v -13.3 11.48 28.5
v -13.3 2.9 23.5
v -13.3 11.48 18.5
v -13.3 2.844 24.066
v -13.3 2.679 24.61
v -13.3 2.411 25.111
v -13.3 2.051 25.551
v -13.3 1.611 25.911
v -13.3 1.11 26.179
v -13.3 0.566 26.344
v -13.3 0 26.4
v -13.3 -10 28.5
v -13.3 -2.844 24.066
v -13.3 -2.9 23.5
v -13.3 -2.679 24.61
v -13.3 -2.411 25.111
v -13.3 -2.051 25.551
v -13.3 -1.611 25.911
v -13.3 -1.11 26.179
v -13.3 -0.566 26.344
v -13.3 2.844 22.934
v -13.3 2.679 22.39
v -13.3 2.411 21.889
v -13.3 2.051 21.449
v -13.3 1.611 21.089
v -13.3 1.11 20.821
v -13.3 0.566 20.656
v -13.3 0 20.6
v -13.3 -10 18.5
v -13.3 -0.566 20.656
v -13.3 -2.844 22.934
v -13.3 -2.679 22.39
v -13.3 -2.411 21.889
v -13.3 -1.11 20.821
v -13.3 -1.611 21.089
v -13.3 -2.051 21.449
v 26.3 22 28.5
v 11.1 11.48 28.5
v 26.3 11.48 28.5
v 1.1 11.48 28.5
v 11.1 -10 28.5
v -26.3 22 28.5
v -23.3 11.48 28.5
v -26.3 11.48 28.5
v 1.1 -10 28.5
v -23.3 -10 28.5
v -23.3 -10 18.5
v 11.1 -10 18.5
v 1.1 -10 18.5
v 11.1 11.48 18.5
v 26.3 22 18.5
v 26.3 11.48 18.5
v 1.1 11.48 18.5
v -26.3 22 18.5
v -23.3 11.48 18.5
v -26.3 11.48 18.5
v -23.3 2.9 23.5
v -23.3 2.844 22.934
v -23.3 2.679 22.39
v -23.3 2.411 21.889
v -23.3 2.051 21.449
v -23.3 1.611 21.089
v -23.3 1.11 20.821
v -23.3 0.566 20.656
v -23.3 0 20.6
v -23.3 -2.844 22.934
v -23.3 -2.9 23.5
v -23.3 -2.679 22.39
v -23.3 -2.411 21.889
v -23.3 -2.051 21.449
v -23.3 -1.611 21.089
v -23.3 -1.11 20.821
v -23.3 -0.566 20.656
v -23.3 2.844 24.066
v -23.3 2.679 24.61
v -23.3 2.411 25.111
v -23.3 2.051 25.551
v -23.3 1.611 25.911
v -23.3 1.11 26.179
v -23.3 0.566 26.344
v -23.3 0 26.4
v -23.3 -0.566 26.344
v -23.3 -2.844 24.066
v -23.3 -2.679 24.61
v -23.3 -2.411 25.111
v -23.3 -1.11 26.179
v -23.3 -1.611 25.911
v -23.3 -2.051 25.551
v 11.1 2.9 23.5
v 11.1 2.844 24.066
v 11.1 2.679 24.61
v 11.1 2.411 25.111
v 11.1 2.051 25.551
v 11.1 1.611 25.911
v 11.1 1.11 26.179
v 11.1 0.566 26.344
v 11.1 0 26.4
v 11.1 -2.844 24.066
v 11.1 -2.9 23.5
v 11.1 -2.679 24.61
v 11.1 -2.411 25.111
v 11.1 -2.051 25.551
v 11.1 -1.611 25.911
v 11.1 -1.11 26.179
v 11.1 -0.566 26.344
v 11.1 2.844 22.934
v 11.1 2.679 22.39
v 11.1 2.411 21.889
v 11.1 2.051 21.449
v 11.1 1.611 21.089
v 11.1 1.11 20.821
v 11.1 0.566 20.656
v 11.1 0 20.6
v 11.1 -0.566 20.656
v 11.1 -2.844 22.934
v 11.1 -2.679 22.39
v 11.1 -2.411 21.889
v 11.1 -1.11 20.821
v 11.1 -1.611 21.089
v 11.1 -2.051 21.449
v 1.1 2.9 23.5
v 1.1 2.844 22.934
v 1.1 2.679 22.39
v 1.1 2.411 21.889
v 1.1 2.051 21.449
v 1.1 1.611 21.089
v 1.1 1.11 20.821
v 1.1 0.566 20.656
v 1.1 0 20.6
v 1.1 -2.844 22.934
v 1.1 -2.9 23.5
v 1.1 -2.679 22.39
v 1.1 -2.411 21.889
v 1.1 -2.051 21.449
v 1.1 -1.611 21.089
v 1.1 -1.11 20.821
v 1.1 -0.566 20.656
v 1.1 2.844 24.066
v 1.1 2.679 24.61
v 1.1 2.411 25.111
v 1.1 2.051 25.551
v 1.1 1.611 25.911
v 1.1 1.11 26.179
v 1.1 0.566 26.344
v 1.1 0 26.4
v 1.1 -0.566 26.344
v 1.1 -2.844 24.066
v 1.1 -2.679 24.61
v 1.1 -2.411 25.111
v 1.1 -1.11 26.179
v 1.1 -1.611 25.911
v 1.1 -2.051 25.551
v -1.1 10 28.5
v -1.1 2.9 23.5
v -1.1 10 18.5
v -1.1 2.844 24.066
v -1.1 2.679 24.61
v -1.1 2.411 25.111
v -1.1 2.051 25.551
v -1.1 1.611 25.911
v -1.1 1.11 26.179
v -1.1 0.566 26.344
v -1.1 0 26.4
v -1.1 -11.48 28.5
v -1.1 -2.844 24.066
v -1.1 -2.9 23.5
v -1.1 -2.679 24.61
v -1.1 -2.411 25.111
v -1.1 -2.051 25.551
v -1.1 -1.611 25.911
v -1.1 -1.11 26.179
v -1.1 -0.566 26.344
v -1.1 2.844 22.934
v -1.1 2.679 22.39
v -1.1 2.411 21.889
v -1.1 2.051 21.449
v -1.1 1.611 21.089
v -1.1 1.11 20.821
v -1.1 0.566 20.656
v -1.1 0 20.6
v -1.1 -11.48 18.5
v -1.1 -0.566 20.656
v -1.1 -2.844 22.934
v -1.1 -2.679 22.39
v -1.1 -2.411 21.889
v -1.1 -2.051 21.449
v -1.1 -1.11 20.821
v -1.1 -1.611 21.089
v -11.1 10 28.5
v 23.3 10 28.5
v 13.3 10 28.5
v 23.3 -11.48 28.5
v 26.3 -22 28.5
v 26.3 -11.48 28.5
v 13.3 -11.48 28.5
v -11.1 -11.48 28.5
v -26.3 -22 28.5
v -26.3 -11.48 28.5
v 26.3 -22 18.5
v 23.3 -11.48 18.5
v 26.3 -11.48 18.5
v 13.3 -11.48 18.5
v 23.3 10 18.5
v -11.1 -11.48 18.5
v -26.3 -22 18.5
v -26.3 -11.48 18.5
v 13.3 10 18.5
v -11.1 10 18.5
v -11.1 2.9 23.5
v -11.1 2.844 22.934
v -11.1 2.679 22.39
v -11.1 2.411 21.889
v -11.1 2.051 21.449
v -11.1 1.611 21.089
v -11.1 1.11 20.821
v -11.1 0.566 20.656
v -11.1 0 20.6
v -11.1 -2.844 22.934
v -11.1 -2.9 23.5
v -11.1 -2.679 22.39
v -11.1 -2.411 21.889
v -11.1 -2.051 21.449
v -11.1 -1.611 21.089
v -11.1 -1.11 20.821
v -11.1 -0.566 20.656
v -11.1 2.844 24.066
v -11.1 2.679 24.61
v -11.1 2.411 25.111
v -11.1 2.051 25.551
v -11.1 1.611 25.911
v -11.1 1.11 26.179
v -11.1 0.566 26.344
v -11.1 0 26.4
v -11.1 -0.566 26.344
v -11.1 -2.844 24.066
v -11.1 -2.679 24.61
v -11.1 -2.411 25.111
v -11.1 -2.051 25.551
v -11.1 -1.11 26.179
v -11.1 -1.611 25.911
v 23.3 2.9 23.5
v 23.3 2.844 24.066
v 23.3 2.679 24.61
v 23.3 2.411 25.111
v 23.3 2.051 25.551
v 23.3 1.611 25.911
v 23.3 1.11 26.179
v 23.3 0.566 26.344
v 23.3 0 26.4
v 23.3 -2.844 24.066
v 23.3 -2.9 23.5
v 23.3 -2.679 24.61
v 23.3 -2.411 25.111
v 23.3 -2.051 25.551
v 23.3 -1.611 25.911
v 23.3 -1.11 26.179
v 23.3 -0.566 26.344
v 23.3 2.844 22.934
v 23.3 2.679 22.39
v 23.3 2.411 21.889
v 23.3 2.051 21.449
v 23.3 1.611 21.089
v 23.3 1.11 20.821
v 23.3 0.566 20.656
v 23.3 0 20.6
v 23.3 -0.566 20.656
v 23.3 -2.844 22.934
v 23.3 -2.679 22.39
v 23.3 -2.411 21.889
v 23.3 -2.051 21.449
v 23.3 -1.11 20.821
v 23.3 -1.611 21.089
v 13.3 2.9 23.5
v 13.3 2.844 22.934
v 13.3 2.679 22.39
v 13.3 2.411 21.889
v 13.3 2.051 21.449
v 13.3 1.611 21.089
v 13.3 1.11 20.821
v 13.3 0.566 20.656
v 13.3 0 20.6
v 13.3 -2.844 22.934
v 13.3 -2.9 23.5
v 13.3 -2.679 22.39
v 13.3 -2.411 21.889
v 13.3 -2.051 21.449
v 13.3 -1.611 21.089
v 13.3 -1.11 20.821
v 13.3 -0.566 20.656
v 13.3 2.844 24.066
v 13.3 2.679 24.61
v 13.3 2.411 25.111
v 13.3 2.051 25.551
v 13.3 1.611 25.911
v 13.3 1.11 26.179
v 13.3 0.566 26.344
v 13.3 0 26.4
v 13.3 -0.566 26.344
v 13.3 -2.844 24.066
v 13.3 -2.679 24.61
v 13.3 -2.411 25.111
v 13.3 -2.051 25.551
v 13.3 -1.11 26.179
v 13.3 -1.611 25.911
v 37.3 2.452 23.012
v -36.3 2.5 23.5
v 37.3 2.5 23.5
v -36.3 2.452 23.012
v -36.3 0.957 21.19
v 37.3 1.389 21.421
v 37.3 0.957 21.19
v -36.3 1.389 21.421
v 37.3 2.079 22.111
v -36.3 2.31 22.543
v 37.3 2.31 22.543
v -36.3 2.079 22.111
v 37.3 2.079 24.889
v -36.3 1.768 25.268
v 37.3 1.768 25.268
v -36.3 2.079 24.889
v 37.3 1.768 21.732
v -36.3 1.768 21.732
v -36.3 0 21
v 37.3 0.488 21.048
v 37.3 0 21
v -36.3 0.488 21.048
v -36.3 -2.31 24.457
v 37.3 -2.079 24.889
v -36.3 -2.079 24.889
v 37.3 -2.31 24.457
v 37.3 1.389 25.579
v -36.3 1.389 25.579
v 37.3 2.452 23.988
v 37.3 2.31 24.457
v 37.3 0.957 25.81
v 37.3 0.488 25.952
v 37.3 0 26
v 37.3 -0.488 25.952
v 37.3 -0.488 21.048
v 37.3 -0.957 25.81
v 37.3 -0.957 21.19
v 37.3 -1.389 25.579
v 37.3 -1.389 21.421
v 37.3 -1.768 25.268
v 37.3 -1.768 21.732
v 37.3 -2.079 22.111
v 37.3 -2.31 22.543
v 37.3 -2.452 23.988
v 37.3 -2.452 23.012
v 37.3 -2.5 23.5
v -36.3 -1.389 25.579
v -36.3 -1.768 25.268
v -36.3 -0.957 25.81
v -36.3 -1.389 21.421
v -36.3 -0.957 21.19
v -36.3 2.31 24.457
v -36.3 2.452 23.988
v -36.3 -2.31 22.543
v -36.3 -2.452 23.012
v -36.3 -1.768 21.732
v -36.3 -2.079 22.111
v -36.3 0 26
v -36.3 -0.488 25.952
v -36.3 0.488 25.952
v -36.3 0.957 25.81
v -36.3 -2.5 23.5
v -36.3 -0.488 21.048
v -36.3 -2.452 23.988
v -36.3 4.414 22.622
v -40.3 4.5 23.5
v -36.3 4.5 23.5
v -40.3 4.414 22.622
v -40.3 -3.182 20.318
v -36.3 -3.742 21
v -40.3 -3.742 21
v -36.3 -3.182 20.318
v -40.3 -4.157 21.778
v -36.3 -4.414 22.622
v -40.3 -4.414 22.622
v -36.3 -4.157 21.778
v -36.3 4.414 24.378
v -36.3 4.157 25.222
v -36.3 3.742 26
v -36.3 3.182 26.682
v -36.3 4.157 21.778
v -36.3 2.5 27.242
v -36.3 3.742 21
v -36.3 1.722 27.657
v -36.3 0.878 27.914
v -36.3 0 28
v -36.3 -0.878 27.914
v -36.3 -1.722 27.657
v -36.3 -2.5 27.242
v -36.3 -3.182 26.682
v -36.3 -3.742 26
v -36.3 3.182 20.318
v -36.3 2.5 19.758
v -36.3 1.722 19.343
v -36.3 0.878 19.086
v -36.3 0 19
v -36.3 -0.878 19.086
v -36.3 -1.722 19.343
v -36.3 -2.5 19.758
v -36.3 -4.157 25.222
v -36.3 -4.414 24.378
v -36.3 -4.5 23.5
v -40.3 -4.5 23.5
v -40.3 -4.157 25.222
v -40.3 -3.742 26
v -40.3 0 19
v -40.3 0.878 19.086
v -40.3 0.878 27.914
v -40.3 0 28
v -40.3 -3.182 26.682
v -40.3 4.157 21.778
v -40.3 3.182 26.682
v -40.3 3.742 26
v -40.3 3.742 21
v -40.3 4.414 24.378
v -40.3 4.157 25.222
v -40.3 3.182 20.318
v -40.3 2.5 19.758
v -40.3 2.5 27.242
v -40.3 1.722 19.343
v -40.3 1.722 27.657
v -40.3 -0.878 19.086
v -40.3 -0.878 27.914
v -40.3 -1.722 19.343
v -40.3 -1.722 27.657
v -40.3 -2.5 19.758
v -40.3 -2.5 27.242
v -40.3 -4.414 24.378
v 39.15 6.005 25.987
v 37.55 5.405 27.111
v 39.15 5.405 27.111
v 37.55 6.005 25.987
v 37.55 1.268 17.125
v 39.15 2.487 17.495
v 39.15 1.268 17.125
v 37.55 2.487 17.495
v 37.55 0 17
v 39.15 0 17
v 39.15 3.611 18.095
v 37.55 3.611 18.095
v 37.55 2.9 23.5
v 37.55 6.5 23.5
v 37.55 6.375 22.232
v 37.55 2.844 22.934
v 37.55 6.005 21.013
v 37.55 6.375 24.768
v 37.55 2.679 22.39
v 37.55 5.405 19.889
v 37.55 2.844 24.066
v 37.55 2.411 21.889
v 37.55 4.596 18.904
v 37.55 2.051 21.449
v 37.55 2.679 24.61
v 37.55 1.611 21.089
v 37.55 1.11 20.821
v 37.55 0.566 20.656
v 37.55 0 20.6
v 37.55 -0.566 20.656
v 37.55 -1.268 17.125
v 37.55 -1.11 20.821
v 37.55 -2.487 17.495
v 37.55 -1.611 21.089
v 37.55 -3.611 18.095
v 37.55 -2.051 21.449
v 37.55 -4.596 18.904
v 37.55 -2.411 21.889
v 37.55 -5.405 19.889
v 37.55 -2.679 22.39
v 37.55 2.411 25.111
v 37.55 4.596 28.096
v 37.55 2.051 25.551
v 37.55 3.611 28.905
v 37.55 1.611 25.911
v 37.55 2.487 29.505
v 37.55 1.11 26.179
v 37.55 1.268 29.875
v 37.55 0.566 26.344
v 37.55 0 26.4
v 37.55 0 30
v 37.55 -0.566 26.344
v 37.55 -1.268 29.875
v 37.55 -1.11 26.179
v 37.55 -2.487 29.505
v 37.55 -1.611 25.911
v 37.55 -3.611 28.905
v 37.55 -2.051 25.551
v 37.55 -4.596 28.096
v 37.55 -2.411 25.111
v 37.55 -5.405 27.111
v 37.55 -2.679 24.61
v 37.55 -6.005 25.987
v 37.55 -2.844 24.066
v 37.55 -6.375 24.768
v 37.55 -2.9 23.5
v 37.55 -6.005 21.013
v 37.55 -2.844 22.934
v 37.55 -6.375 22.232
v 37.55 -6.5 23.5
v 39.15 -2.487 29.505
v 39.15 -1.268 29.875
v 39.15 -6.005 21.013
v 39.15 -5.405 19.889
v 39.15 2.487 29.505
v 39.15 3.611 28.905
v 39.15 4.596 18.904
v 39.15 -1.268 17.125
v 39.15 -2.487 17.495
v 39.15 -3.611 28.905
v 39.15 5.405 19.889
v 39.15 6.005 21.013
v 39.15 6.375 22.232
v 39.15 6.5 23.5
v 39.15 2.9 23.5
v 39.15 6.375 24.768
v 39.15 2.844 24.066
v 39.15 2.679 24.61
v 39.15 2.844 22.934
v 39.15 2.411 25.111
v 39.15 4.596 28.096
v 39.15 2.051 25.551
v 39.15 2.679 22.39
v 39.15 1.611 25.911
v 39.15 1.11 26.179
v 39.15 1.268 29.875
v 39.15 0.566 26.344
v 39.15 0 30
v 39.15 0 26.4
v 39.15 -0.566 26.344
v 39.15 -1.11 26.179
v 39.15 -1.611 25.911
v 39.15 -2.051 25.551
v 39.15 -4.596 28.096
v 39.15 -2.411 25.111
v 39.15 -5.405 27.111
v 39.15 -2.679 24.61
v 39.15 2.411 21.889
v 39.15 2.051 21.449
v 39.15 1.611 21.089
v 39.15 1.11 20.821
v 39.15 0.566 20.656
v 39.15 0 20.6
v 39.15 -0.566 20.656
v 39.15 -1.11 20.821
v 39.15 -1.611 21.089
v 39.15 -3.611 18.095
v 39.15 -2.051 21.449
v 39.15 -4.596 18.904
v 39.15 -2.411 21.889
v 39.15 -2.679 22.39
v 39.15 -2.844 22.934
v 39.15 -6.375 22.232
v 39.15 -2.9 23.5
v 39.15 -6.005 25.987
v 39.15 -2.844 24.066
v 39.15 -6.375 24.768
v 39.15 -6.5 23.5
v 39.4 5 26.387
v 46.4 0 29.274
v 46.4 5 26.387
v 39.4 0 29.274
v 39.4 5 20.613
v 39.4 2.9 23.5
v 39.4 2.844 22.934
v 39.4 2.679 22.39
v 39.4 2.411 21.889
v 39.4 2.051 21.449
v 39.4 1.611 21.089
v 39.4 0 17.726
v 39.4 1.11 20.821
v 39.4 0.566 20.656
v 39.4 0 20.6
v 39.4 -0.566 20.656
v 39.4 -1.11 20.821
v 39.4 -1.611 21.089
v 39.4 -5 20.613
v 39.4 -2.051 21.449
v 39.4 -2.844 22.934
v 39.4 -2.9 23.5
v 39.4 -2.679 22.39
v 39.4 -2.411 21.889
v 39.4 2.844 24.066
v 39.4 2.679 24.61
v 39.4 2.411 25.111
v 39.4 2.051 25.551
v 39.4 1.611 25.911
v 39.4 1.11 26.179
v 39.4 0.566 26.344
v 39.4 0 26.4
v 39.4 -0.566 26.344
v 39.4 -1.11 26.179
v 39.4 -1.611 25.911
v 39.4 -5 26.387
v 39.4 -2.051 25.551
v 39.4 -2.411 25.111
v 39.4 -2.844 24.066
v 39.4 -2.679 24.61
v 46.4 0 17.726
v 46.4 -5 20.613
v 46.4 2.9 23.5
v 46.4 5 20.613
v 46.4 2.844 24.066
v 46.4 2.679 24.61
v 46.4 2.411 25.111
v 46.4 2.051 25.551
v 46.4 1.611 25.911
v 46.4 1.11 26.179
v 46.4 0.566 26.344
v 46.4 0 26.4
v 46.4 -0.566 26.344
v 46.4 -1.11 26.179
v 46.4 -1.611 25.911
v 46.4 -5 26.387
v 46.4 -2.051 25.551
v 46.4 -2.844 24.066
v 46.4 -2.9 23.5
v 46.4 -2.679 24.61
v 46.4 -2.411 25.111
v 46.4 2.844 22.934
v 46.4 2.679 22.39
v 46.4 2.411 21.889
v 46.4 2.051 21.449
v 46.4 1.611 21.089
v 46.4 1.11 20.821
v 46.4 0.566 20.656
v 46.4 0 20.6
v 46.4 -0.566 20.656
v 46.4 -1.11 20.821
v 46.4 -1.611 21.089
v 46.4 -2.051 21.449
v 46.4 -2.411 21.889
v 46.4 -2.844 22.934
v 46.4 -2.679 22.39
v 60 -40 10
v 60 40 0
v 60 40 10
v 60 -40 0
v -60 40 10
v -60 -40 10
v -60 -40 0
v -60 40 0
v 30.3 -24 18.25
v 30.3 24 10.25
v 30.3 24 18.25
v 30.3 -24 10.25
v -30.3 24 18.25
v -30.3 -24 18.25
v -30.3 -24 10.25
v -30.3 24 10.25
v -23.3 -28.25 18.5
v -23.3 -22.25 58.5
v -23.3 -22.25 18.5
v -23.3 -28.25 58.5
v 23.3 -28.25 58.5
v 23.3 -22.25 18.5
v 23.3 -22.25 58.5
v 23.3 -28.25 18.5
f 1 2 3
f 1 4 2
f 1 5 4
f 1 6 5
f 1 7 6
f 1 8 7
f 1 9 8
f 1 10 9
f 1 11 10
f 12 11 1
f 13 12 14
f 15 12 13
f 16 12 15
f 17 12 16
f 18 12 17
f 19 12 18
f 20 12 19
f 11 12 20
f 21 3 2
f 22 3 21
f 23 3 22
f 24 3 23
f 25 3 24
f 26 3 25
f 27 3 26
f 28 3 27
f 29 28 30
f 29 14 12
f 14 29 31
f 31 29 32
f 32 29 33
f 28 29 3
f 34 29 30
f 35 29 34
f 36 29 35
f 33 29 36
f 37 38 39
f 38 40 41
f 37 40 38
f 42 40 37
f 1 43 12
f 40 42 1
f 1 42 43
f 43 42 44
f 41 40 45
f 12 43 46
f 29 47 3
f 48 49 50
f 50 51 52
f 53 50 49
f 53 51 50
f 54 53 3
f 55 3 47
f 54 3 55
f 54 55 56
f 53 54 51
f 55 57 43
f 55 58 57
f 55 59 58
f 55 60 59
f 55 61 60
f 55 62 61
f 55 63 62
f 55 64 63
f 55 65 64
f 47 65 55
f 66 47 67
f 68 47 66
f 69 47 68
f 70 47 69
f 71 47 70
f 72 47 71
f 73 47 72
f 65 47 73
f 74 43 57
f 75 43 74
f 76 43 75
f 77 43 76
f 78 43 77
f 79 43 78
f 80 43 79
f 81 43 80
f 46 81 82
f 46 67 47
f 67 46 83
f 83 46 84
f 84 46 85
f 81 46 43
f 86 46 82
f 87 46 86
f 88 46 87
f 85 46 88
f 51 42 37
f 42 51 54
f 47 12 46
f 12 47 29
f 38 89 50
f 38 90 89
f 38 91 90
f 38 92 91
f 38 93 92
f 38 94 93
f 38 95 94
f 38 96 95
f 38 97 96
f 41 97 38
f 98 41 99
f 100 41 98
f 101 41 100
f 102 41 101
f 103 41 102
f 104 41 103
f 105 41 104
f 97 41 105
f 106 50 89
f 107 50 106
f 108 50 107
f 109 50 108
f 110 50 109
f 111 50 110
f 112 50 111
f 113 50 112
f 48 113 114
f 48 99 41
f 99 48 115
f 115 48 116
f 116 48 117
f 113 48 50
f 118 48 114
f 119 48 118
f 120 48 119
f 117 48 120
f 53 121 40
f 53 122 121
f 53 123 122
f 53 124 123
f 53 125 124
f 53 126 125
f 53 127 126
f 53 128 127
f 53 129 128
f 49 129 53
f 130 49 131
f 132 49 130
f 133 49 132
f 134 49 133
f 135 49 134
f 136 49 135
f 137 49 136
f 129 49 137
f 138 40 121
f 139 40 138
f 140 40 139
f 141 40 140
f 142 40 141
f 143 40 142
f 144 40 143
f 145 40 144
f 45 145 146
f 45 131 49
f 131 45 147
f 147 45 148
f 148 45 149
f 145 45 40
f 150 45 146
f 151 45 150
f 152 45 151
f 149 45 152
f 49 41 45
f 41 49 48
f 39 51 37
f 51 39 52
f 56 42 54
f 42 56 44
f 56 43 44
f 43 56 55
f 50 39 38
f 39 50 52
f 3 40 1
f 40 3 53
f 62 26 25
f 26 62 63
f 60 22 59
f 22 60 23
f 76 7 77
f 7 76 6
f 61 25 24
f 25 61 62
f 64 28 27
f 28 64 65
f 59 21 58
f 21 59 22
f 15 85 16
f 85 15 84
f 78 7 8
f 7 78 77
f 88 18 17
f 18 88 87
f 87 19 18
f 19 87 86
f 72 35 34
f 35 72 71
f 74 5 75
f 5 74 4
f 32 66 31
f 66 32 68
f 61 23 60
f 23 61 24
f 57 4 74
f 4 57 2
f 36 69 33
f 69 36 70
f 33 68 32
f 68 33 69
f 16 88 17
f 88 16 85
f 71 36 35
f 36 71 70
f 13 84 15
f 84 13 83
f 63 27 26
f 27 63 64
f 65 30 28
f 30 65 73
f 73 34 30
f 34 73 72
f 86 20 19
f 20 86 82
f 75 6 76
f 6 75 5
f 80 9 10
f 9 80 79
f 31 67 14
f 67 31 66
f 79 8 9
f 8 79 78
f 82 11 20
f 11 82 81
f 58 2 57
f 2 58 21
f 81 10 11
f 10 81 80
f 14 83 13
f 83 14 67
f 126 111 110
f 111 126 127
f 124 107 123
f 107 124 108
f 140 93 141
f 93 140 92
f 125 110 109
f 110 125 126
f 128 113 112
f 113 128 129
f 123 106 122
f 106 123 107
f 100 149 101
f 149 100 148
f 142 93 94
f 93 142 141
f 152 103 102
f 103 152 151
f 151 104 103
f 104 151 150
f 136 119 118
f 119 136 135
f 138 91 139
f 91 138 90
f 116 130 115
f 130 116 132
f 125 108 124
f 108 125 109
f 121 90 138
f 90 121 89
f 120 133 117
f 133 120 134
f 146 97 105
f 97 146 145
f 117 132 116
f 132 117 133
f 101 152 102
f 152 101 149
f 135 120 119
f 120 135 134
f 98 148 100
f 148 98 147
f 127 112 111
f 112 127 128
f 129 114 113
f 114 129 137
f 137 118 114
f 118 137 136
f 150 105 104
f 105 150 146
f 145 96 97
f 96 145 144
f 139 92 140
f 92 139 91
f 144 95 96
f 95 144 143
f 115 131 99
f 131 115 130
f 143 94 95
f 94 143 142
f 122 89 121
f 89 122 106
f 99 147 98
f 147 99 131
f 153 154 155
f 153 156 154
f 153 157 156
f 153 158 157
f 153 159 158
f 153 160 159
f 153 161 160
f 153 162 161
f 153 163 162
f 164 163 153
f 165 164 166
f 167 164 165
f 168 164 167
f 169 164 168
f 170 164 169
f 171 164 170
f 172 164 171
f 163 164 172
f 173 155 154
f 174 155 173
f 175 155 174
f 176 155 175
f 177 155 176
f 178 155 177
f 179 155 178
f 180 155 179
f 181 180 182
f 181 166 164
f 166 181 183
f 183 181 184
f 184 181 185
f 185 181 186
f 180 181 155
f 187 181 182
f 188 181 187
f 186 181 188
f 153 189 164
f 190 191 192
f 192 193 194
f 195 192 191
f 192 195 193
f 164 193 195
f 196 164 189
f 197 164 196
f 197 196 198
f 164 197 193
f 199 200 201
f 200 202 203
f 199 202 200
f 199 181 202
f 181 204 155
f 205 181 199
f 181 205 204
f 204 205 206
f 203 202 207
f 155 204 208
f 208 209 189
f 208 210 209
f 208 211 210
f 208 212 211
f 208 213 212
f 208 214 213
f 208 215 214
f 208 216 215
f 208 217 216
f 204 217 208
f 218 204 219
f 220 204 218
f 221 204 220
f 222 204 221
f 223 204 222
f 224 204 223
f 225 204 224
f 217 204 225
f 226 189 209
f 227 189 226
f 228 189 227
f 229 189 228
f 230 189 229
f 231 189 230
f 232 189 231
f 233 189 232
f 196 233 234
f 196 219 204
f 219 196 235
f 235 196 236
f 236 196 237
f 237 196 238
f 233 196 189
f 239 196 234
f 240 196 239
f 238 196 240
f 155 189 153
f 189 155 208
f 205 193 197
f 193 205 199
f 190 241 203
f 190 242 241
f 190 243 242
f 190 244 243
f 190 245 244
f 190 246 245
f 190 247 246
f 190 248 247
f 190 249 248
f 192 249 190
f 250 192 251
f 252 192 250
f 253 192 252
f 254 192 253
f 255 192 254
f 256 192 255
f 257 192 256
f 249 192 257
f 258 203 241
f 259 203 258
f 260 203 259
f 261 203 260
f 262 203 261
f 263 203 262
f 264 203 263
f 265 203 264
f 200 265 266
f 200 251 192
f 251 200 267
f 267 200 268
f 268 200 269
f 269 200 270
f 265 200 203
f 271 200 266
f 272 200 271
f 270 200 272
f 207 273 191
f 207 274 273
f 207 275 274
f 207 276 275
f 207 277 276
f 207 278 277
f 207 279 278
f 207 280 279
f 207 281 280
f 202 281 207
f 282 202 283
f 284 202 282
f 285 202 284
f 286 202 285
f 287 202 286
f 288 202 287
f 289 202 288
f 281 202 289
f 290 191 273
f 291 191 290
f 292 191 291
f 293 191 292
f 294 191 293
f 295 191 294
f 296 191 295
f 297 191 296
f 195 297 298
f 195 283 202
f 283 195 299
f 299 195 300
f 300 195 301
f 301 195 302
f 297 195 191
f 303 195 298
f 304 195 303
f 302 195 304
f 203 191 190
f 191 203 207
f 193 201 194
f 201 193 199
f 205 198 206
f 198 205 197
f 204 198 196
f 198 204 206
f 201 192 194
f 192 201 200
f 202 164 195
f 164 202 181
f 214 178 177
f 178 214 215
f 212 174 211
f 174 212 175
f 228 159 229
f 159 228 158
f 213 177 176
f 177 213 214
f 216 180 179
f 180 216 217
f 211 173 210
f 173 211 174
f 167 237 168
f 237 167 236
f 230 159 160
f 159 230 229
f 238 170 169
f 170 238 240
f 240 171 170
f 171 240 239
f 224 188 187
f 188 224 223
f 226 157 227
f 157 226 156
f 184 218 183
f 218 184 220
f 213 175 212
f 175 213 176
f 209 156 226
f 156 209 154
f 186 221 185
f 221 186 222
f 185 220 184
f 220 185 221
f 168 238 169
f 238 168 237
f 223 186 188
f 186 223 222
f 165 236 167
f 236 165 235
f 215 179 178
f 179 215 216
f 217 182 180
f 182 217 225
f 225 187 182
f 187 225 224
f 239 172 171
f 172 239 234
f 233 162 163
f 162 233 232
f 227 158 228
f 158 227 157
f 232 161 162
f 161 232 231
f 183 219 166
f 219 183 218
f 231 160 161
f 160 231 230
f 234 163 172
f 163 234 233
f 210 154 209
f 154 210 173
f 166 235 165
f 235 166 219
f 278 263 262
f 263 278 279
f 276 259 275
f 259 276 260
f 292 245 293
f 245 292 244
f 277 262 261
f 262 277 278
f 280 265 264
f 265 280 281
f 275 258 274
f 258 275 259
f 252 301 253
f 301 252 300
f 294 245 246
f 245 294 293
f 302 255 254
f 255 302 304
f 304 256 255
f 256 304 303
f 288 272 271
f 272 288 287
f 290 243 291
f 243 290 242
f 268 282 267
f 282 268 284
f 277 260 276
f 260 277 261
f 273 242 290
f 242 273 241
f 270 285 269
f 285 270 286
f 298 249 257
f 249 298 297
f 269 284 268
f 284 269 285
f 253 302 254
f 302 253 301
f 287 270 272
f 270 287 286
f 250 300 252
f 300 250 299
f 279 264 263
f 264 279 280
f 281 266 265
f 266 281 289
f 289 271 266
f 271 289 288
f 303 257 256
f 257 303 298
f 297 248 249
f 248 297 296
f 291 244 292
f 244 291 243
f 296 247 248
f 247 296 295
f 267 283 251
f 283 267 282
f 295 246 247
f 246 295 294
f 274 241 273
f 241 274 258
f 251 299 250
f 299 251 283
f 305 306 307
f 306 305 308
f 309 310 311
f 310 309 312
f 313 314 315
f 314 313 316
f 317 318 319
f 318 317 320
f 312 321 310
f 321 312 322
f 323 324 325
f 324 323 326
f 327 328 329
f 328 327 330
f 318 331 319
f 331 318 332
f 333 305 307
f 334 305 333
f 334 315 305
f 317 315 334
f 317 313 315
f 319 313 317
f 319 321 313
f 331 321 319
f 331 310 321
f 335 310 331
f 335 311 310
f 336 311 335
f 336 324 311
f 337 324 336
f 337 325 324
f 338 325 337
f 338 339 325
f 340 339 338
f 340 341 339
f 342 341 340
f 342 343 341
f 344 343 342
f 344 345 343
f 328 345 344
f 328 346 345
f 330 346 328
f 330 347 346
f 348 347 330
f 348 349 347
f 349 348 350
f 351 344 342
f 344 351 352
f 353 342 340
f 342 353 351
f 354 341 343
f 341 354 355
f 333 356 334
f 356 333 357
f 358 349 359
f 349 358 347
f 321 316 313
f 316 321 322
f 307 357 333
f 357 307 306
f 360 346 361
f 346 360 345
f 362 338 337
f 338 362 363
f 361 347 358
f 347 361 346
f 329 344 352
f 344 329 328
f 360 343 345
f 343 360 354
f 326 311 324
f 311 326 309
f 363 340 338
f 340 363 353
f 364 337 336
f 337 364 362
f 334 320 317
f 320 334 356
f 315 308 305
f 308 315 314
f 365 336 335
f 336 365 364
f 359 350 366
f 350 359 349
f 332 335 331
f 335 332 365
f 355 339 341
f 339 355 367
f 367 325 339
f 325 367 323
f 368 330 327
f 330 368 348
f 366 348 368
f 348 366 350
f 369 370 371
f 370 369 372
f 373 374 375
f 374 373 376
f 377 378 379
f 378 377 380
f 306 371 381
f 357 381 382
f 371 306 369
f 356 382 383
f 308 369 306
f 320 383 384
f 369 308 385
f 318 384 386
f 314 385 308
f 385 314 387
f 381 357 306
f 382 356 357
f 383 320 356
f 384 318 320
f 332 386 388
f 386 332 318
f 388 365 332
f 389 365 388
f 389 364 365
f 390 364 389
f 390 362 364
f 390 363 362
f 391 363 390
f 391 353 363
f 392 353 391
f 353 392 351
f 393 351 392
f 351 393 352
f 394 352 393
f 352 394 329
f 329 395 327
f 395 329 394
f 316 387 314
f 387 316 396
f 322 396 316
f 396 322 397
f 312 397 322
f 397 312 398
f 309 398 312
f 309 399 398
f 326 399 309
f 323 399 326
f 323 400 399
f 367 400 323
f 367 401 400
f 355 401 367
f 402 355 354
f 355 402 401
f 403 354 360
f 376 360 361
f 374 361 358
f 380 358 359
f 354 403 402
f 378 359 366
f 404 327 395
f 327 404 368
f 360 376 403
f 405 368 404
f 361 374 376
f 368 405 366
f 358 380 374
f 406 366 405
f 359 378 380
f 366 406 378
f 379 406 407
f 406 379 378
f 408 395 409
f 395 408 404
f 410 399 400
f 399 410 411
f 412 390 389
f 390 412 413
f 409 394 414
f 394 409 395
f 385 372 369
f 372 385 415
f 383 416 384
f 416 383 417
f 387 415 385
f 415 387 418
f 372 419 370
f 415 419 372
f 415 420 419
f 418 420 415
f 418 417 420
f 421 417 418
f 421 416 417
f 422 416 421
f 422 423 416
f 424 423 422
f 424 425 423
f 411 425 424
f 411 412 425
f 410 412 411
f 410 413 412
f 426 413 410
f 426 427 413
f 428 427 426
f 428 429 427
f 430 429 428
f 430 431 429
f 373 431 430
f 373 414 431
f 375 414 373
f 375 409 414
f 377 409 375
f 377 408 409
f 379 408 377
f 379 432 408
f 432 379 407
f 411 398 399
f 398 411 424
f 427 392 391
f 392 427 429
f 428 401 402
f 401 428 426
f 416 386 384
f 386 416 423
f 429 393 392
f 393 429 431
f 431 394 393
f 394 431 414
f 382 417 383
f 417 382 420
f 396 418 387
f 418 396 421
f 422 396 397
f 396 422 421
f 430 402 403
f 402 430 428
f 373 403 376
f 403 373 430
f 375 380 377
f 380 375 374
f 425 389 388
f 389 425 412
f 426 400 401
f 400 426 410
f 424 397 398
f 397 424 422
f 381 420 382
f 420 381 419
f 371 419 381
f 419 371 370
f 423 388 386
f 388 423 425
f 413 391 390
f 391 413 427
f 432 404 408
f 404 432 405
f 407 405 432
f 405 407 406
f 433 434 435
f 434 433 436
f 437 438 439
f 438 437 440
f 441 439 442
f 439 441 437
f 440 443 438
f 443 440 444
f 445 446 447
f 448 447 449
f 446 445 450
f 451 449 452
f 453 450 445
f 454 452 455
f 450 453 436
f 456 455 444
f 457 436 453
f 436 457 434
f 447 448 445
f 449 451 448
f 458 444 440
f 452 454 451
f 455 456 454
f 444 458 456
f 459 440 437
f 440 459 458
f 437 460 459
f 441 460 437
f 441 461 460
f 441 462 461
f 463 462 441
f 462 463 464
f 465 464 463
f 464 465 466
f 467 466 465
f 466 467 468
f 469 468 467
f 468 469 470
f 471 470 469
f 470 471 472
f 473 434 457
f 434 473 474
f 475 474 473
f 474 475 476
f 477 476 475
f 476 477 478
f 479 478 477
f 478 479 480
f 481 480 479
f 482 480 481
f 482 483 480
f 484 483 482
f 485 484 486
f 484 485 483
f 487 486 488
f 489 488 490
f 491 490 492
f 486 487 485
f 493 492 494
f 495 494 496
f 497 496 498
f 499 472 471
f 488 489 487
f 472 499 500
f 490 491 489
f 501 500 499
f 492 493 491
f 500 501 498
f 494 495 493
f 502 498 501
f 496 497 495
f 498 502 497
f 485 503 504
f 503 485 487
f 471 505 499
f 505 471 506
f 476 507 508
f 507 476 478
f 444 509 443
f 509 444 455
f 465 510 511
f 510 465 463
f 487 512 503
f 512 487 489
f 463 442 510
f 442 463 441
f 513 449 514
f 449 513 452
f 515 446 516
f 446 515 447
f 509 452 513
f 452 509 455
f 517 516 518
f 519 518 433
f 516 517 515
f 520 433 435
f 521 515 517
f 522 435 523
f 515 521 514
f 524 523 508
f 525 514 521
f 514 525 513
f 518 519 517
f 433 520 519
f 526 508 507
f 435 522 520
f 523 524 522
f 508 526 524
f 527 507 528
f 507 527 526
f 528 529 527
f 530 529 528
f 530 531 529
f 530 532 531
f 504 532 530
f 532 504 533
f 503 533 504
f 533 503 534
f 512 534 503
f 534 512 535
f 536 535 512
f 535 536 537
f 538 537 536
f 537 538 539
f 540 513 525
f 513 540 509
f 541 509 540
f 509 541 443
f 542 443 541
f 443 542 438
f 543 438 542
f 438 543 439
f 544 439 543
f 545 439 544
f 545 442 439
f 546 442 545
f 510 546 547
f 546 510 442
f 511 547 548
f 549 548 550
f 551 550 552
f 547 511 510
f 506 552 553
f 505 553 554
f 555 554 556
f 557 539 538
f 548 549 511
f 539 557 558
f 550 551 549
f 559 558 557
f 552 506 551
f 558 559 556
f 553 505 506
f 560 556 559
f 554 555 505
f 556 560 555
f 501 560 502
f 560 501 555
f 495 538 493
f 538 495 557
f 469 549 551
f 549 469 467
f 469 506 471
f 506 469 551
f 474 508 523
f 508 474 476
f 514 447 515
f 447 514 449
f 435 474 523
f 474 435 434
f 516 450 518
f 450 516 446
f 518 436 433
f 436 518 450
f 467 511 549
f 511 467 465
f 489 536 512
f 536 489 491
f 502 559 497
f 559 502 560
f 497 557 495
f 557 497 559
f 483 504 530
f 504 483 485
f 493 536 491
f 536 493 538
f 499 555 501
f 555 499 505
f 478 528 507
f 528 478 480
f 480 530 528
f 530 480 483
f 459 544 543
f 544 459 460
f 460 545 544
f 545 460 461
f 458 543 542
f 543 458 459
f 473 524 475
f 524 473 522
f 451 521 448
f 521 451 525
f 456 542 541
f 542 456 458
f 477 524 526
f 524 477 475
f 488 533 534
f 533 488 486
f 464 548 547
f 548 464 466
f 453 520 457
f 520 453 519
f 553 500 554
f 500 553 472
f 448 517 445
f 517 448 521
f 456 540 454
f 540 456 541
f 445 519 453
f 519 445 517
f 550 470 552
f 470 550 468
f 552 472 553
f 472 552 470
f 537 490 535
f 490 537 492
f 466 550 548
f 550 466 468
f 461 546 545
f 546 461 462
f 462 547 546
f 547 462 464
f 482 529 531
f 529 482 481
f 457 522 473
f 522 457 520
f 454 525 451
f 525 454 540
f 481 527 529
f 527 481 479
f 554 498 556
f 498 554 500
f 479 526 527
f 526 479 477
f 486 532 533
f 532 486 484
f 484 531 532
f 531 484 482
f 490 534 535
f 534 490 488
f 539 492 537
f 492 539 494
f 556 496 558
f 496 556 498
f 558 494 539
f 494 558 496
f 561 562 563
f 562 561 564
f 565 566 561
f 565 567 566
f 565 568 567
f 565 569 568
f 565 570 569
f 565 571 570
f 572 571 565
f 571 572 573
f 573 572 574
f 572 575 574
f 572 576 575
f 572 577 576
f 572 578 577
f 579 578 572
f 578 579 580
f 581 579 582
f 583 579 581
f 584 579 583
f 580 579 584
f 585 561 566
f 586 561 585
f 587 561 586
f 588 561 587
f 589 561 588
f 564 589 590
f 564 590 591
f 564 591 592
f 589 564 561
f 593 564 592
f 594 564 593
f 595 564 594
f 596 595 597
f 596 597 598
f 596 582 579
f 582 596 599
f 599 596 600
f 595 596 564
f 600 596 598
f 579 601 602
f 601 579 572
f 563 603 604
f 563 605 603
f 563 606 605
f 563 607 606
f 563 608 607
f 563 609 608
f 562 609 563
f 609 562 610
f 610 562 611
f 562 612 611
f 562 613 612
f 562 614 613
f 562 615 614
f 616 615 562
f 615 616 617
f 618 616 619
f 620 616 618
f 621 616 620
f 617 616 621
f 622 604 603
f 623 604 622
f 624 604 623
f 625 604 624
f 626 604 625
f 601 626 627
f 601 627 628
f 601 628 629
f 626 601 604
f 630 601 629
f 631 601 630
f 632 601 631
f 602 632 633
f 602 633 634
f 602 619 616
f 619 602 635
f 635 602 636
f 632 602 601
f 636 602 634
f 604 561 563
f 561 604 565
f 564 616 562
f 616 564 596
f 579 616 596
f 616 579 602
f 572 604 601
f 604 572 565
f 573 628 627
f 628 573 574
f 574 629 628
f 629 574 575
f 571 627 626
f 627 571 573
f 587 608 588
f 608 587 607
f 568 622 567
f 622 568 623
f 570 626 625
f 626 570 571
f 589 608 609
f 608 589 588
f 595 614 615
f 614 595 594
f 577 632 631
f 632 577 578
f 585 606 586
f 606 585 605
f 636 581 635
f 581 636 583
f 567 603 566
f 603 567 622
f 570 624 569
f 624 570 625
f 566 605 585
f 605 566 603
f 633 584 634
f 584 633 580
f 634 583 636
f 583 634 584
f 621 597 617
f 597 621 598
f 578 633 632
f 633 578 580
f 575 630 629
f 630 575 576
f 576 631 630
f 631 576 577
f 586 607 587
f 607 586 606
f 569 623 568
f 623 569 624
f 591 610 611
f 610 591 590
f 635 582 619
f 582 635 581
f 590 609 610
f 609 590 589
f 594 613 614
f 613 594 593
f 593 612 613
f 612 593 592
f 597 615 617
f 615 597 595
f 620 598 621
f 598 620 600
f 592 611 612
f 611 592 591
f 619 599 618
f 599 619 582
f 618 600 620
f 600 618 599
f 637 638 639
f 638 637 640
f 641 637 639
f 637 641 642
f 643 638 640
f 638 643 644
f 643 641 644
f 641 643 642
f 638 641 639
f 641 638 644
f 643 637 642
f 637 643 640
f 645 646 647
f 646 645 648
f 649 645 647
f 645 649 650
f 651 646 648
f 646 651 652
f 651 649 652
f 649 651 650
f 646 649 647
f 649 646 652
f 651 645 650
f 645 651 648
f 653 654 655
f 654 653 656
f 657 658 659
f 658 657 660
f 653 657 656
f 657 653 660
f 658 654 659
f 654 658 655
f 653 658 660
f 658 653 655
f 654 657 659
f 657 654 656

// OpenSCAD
$fn = 32;

// ------------------------------------------------------------------------
// Comb hinge with flap: leaf 52.6 x 22 mm, pin d5, flap 40 mm
// Every part is its own module, assembly() places every instance.
// ------------------------------------------------------------------------

// --- part 1 ---
module hinge_bed() {
  difference() {
    translate([-60, -40, 0]) cube([120, 80, 10]);
  }
}

// --- part 2 ---
module hinge_riser() {
  difference() {
    translate([-30.3, -24, 0]) cube([60.6, 48, 8]);
  }
}

// --- part 3 ---
module hinge_leaf_a() {
  difference() {
    union() {
      translate([-23.3, -10, -5]) cube([10, 32, 10]);
      translate([1.1, -10, -5]) cube([10, 32, 10]);
      translate([-26.3, 11.48, -5]) cube([52.6, 10.52, 10]);
    }
    translate([-18.3, 0, 0]) rotate([0, 90, 0]) cylinder(h = 12, d = 5.8, center = true);
    translate([6.1, 0, 0]) rotate([0, 90, 0]) cylinder(h = 12, d = 5.8, center = true);
  }
}

// --- part 4 ---
module hinge_leaf_b() {
  difference() {
    union() {
      translate([-11.1, -22, -5]) cube([10, 32, 10]);
      translate([13.3, -22, -5]) cube([10, 32, 10]);
      translate([-26.3, -22, -5]) cube([52.6, 10.52, 10]);
    }
    translate([-6.1, 0, 0]) rotate([0, 90, 0]) cylinder(h = 12, d = 5.8, center = true);
    translate([18.3, 0, 0]) rotate([0, 90, 0]) cylinder(h = 12, d = 5.8, center = true);
  }
}

// --- part 5 ---
module hinge_flap() {
  difference() {
    translate([-23.3, -20, 0]) cube([46.6, 40, 6]);
  }
}

// --- part 6 ---
module hinge_pin() {
  rotate([0, 90, 0]) cylinder(h = 74.6, d = 5, center = true);
  translate([-40.3, 0, 0]) rotate([0, 90, 0]) cylinder(h = 4, d = 9);
}

// --- part 7 ---
module pin_washer() {
  difference() {
      translate([0, 0, 0]) cylinder(h = 1.6, d = 13);
      translate([0, 0, -1]) cylinder(h = 3.6, d = 5.8);
    }
}

// --- part 8 ---
module pin_nut() {
  difference() {
    linear_extrude(height = 7) polygon(points = [[5.774, 0], [2.887, 5], [-2.887, 5], [-5.774, 0], [-2.887, -5], [2.887, -5]]);
    translate([0, 0, -1]) cylinder(h = 9, d = 5.8);
  }
}

// --- assembly ---
module assembly() {
  color([0.80, 0.24, 0.20]) translate([0, 0, 0]) rotate([0, 0, 0]) hinge_bed();
  color([0.20, 0.45, 0.75]) translate([0, 0, 10.25]) rotate([0, 0, 0]) hinge_riser();
  color([0.25, 0.62, 0.32]) translate([0, 0, 23.5]) rotate([0, 0, 0]) hinge_leaf_a();
  color([0.92, 0.70, 0.18]) translate([0, 0, 23.5]) rotate([0, 0, 0]) hinge_leaf_b();
  color([0.58, 0.35, 0.70]) translate([0, -22.25, 38.5]) rotate([90, 0, 0]) hinge_flap();
  color([0.16, 0.66, 0.66]) translate([0, 0, 23.5]) rotate([0, 0, 0]) hinge_pin();
  color([0.85, 0.48, 0.18]) translate([37.55, 0, 23.5]) rotate([0, 90, 0]) pin_washer();
  color([0.55, 0.60, 0.65]) translate([39.4, 0, 23.5]) rotate([0, 90, 0]) pin_nut();
}

assembly();
